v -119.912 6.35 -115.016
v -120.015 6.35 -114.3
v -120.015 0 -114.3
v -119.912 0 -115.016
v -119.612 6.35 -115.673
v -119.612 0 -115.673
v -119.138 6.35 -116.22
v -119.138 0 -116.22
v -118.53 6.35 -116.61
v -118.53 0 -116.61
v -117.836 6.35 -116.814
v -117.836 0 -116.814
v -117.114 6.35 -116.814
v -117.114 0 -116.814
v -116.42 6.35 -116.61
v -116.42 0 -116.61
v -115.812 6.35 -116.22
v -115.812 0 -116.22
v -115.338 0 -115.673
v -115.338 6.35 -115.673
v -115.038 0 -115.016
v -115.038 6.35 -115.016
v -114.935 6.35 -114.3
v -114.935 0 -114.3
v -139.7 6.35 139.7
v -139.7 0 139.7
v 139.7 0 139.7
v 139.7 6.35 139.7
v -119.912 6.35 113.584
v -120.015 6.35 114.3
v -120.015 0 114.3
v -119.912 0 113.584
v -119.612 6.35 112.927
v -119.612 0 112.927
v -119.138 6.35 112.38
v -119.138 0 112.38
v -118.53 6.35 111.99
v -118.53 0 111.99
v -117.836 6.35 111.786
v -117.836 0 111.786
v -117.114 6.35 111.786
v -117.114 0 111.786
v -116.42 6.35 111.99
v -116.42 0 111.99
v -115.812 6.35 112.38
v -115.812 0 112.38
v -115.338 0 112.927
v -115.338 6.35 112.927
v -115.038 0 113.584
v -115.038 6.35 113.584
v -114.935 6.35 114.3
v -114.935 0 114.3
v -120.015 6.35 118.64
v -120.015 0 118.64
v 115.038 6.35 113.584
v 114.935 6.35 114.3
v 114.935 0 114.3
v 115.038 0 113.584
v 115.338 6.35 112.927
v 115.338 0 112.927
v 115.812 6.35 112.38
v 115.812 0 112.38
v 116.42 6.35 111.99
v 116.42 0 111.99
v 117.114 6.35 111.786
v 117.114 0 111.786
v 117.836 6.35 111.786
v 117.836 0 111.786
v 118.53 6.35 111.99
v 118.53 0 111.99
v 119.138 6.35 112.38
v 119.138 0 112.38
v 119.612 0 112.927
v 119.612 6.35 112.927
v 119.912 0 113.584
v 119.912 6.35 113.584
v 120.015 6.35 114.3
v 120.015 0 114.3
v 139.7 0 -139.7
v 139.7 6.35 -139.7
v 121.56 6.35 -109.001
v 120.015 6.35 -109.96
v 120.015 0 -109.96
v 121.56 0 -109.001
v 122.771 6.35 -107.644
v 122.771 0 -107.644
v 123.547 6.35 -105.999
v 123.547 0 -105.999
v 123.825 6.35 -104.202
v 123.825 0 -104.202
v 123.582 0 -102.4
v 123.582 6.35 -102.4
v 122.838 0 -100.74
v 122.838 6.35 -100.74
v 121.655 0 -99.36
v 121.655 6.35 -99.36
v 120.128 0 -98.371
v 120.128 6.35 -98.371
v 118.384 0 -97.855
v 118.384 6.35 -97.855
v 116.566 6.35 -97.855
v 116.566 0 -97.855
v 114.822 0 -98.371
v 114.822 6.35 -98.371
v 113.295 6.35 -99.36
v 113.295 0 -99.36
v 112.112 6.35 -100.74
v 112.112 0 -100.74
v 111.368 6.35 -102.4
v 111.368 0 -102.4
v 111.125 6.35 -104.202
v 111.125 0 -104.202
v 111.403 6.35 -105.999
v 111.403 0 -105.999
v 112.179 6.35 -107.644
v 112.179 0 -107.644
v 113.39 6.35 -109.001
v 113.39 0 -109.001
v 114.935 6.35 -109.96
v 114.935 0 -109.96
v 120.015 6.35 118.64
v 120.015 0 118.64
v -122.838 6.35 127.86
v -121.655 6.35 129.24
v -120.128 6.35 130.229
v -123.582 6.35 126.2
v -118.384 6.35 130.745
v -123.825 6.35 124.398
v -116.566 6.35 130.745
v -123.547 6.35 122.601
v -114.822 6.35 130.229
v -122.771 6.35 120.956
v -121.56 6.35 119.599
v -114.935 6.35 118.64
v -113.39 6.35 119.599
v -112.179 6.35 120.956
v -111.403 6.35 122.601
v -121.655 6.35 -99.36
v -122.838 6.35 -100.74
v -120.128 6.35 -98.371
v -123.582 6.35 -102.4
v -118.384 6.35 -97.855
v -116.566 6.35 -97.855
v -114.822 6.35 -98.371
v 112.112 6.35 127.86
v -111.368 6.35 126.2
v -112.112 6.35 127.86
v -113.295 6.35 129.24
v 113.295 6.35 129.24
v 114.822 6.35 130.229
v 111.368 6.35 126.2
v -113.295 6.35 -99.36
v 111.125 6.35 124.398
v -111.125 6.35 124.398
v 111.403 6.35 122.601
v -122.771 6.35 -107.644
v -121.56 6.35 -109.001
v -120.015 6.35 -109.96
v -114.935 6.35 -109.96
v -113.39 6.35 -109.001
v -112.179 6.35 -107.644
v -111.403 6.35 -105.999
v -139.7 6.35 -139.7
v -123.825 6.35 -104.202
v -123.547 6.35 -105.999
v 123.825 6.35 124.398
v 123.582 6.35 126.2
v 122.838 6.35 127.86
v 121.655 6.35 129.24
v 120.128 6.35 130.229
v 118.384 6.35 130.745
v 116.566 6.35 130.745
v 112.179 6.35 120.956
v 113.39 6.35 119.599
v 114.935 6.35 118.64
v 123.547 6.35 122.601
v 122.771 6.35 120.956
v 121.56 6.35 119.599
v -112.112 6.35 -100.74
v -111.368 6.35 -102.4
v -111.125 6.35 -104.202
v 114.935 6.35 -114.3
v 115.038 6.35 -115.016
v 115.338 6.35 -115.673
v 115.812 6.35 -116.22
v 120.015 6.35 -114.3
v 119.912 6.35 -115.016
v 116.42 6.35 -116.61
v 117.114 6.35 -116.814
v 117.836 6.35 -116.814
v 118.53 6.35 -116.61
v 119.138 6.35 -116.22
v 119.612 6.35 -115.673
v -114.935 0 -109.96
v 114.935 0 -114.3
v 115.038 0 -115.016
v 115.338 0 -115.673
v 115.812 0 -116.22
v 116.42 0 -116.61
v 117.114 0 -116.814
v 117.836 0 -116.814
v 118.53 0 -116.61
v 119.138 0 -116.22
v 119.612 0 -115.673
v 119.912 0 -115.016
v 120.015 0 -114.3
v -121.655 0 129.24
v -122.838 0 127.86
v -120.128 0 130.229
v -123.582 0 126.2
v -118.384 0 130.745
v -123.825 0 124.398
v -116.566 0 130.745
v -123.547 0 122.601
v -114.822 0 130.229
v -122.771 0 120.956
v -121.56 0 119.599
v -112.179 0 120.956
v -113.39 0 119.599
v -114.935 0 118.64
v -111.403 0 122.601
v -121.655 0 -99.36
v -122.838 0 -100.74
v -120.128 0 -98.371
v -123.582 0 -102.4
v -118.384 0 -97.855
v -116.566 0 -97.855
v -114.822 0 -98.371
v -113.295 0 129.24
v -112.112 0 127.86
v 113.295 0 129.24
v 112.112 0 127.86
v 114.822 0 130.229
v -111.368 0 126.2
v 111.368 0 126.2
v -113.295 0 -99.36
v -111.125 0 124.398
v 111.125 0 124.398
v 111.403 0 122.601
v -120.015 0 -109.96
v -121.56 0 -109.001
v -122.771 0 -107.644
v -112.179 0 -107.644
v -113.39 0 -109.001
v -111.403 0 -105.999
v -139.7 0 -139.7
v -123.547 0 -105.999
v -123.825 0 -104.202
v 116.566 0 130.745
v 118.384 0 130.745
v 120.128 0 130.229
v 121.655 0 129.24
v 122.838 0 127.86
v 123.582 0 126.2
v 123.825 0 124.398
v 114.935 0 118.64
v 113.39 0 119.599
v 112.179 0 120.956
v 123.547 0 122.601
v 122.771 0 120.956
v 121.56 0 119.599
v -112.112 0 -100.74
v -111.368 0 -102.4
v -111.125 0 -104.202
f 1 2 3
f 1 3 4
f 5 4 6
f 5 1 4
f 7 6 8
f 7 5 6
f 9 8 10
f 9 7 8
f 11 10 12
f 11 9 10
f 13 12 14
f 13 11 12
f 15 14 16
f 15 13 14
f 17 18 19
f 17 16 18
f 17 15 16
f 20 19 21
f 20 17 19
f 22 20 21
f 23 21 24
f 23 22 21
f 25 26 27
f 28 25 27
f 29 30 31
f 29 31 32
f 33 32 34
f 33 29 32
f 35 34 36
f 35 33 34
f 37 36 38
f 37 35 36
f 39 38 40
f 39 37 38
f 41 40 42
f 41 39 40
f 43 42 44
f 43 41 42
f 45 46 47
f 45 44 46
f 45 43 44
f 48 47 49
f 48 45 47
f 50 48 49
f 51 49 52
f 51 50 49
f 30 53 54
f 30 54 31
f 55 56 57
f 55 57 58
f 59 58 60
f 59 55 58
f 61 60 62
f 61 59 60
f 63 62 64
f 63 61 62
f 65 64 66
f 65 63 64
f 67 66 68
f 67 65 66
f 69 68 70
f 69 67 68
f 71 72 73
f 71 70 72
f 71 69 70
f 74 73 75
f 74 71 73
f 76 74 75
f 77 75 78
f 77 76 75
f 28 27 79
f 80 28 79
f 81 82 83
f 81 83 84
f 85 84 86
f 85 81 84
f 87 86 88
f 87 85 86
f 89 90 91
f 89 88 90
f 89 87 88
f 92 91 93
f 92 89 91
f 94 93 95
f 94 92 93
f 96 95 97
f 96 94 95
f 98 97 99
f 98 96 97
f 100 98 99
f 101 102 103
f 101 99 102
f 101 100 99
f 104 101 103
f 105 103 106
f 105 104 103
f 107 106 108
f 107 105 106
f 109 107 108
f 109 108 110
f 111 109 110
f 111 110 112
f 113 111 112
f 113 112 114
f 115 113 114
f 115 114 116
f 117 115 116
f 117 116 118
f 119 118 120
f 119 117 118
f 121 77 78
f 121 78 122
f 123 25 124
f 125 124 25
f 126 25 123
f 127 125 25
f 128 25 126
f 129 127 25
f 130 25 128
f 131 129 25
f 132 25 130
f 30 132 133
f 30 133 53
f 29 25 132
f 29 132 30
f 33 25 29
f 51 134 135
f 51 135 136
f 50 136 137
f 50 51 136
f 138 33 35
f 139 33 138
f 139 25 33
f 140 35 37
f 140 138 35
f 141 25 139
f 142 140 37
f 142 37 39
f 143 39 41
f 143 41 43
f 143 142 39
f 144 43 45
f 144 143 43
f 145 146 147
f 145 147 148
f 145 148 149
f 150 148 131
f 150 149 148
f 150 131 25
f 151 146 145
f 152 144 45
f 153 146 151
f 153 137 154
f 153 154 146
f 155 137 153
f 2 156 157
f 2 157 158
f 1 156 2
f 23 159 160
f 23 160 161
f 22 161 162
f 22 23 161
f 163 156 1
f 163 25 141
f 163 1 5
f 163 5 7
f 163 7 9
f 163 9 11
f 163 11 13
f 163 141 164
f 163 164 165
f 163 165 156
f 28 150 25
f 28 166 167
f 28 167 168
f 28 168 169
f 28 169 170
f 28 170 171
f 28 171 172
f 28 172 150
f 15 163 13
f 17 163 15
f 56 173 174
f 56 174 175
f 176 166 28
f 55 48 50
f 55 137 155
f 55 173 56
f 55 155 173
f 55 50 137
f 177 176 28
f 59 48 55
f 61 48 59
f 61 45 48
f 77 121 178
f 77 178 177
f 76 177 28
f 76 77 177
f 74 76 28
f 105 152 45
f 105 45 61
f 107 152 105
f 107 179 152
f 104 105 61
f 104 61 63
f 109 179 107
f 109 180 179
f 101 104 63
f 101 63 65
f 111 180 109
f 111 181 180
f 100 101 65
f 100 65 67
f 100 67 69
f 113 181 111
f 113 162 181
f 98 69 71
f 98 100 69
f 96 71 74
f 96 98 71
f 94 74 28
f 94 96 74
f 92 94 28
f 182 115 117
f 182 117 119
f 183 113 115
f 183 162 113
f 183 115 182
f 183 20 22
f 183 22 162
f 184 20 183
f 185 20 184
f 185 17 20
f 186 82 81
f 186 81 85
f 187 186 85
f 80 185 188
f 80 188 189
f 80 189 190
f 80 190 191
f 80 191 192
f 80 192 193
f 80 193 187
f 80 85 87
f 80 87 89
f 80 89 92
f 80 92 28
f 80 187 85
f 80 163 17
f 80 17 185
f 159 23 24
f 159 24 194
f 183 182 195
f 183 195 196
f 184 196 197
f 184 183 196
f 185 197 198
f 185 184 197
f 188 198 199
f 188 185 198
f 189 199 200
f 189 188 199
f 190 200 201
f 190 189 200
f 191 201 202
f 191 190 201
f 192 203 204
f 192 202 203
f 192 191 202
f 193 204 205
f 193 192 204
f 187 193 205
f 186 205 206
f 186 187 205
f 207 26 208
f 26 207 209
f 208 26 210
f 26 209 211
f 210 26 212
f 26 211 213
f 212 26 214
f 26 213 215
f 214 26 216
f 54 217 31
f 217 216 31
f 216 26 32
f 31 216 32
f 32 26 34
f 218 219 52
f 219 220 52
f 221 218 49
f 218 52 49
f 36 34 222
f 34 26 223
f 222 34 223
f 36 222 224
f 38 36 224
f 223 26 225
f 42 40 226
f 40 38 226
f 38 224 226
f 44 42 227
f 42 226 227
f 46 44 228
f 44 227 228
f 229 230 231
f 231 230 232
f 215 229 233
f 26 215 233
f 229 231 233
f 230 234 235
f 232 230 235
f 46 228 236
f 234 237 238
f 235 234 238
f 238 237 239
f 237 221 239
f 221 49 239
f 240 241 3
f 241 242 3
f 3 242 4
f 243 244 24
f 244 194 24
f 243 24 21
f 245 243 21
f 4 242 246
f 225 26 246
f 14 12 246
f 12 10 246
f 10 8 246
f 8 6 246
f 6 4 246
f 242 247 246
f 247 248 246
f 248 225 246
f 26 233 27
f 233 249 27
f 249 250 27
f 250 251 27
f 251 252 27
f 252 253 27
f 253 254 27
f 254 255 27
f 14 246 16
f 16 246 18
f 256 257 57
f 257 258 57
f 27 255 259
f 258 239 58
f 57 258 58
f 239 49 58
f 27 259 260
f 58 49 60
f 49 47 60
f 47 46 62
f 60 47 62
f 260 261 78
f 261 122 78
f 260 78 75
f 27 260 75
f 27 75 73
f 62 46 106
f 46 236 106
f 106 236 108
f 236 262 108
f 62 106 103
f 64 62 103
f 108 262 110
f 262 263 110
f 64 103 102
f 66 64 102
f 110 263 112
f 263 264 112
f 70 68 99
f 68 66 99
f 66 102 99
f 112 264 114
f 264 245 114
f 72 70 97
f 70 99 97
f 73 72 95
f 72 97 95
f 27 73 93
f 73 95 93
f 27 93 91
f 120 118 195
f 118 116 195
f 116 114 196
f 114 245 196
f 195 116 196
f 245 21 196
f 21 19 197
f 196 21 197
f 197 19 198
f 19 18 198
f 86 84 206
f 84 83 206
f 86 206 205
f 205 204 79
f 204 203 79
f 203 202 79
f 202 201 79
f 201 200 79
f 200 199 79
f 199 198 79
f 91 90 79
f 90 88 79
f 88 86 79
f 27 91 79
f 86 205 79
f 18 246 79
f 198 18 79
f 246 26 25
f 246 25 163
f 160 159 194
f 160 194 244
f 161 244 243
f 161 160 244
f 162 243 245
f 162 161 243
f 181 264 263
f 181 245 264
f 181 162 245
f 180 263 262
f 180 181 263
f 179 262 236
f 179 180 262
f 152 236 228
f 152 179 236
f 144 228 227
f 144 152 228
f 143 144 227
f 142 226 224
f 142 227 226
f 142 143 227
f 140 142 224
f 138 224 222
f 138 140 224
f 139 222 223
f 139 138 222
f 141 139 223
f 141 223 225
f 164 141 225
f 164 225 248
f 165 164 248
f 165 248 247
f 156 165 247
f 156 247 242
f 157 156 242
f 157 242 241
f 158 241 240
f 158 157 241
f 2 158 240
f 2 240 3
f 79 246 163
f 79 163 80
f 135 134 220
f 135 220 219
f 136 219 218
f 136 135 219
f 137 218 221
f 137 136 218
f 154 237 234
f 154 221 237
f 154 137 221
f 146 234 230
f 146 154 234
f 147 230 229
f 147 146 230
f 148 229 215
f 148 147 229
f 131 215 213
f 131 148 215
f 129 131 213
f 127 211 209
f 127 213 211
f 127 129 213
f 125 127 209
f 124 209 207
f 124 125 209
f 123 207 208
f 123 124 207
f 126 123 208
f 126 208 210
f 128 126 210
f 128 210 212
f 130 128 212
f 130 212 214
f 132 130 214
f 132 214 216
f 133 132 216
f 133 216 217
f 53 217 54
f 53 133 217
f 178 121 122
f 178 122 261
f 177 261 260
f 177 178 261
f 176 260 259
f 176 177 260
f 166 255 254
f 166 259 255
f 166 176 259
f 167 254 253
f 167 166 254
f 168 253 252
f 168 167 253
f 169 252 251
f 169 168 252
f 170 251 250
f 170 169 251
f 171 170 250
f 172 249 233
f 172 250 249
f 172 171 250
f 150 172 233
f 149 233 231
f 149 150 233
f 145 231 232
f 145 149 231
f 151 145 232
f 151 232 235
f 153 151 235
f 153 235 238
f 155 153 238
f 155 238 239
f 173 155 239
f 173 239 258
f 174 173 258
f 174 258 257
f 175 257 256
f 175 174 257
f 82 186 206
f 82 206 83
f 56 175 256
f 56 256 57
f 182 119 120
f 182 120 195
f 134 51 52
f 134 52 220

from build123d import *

# Parameters (mm, degrees)
SKETCH1_W            = 279.4
SKETCH1_H            = 279.4
BOSS_EXTRUDE1_DEPTH  = 6.35
CUT_EXTRUDE1_DEPTH   = 198.667656687
LPATTERN1_COUNT      = 2
LPATTERN1_PITCH      = 234.95
LPATTERN1_COUNT_DIR2 = 2
LPATTERN1_PITCH_DIR2 = 228.6


with BuildPart() as part:
    # Sketch1 → Boss-Extrude1 (new body)
    with BuildSketch(Plane(origin=(0, 0, 0), x_dir=(1, 0, 0), z_dir=(0, 1, 0))):
        Rectangle(SKETCH1_W, SKETCH1_H)
    extrude(amount=BOSS_EXTRUDE1_DEPTH)

    # Sketch2 → Cut-Extrude1 (cut, through all)
    with BuildSketch(Plane(origin=(0, 6.35, 0), x_dir=(1, 0, 0), z_dir=(0, 1, 0))):
        with BuildLine():
            Line((-114.935, 114.3), (-114.935, 109.959871133))
            ThreePointArc((-114.935, 109.959871133), (-117.475, 97.79), (-120.015, 109.959871133))
            Line((-120.015, 109.959871133), (-120.015, 114.3))
            ThreePointArc((-120.015, 114.3), (-117.475, 116.84), (-114.935, 114.3))
        make_face()
    cut_extrude1 = extrude(amount=-CUT_EXTRUDE1_DEPTH, mode=Mode.SUBTRACT)

    # LPattern1: Cut-Extrude1 2 × 2
    with Locations(*[(i * LPATTERN1_PITCH, 0, j * LPATTERN1_PITCH_DIR2) for i in range(LPATTERN1_COUNT) for j in range(LPATTERN1_COUNT_DIR2) if (i, j) != (0, 0)]):
        add(cut_extrude1, mode=Mode.SUBTRACT)


solid = part.part
